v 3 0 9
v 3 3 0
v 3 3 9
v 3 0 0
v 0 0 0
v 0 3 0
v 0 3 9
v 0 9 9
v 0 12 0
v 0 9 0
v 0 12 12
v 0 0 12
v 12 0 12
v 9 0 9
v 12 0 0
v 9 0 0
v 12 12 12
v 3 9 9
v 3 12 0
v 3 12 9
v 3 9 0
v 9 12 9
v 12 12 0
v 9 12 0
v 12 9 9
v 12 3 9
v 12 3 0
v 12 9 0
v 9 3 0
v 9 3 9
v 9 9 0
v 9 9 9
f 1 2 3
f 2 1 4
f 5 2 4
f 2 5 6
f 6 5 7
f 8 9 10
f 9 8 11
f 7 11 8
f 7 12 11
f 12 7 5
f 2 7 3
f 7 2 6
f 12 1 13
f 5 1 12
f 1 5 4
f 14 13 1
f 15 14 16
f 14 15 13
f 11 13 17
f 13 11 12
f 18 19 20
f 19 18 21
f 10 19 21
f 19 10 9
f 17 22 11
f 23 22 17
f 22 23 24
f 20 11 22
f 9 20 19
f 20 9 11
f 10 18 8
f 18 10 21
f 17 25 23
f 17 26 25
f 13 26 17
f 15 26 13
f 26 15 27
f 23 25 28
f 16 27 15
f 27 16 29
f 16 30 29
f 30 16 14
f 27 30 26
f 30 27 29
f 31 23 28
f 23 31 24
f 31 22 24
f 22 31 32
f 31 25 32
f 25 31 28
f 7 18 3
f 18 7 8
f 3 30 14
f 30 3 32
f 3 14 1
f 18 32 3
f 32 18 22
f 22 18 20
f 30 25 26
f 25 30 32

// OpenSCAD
cube([3,3,3]);
translate([0,0,3])cube([3,3,3]);
translate([0,0,6])cube([3,3,3]);
translate([0,0,9])cube([3,3,3]);
translate([0,9,0])cube([3,3,12]);
translate([9,0,0])cube([3,3,12]);
translate([9,9,0])cube([3,3,12]);
translate([9,6,9])cube([3,3,3]);
translate([9,3,9])cube([3,3,3]);
translate([6,9,9])cube([3,3,3]);
translate([6,6,9])cube([3,3,3]);
translate([6,3,9])cube([3,3,3]);
translate([6,0,9])cube([3,3,3]);
translate([3,9,9])cube([3,3,3]);
translate([3,6,9])cube([3,3,3]);
translate([3,3,9])cube([3,3,3]);
translate([3,0,9])cube([3,3,3]);
translate([0,6,9])cube([3,3,3]);
translate([0,3,9])cube([3,3,3]);
